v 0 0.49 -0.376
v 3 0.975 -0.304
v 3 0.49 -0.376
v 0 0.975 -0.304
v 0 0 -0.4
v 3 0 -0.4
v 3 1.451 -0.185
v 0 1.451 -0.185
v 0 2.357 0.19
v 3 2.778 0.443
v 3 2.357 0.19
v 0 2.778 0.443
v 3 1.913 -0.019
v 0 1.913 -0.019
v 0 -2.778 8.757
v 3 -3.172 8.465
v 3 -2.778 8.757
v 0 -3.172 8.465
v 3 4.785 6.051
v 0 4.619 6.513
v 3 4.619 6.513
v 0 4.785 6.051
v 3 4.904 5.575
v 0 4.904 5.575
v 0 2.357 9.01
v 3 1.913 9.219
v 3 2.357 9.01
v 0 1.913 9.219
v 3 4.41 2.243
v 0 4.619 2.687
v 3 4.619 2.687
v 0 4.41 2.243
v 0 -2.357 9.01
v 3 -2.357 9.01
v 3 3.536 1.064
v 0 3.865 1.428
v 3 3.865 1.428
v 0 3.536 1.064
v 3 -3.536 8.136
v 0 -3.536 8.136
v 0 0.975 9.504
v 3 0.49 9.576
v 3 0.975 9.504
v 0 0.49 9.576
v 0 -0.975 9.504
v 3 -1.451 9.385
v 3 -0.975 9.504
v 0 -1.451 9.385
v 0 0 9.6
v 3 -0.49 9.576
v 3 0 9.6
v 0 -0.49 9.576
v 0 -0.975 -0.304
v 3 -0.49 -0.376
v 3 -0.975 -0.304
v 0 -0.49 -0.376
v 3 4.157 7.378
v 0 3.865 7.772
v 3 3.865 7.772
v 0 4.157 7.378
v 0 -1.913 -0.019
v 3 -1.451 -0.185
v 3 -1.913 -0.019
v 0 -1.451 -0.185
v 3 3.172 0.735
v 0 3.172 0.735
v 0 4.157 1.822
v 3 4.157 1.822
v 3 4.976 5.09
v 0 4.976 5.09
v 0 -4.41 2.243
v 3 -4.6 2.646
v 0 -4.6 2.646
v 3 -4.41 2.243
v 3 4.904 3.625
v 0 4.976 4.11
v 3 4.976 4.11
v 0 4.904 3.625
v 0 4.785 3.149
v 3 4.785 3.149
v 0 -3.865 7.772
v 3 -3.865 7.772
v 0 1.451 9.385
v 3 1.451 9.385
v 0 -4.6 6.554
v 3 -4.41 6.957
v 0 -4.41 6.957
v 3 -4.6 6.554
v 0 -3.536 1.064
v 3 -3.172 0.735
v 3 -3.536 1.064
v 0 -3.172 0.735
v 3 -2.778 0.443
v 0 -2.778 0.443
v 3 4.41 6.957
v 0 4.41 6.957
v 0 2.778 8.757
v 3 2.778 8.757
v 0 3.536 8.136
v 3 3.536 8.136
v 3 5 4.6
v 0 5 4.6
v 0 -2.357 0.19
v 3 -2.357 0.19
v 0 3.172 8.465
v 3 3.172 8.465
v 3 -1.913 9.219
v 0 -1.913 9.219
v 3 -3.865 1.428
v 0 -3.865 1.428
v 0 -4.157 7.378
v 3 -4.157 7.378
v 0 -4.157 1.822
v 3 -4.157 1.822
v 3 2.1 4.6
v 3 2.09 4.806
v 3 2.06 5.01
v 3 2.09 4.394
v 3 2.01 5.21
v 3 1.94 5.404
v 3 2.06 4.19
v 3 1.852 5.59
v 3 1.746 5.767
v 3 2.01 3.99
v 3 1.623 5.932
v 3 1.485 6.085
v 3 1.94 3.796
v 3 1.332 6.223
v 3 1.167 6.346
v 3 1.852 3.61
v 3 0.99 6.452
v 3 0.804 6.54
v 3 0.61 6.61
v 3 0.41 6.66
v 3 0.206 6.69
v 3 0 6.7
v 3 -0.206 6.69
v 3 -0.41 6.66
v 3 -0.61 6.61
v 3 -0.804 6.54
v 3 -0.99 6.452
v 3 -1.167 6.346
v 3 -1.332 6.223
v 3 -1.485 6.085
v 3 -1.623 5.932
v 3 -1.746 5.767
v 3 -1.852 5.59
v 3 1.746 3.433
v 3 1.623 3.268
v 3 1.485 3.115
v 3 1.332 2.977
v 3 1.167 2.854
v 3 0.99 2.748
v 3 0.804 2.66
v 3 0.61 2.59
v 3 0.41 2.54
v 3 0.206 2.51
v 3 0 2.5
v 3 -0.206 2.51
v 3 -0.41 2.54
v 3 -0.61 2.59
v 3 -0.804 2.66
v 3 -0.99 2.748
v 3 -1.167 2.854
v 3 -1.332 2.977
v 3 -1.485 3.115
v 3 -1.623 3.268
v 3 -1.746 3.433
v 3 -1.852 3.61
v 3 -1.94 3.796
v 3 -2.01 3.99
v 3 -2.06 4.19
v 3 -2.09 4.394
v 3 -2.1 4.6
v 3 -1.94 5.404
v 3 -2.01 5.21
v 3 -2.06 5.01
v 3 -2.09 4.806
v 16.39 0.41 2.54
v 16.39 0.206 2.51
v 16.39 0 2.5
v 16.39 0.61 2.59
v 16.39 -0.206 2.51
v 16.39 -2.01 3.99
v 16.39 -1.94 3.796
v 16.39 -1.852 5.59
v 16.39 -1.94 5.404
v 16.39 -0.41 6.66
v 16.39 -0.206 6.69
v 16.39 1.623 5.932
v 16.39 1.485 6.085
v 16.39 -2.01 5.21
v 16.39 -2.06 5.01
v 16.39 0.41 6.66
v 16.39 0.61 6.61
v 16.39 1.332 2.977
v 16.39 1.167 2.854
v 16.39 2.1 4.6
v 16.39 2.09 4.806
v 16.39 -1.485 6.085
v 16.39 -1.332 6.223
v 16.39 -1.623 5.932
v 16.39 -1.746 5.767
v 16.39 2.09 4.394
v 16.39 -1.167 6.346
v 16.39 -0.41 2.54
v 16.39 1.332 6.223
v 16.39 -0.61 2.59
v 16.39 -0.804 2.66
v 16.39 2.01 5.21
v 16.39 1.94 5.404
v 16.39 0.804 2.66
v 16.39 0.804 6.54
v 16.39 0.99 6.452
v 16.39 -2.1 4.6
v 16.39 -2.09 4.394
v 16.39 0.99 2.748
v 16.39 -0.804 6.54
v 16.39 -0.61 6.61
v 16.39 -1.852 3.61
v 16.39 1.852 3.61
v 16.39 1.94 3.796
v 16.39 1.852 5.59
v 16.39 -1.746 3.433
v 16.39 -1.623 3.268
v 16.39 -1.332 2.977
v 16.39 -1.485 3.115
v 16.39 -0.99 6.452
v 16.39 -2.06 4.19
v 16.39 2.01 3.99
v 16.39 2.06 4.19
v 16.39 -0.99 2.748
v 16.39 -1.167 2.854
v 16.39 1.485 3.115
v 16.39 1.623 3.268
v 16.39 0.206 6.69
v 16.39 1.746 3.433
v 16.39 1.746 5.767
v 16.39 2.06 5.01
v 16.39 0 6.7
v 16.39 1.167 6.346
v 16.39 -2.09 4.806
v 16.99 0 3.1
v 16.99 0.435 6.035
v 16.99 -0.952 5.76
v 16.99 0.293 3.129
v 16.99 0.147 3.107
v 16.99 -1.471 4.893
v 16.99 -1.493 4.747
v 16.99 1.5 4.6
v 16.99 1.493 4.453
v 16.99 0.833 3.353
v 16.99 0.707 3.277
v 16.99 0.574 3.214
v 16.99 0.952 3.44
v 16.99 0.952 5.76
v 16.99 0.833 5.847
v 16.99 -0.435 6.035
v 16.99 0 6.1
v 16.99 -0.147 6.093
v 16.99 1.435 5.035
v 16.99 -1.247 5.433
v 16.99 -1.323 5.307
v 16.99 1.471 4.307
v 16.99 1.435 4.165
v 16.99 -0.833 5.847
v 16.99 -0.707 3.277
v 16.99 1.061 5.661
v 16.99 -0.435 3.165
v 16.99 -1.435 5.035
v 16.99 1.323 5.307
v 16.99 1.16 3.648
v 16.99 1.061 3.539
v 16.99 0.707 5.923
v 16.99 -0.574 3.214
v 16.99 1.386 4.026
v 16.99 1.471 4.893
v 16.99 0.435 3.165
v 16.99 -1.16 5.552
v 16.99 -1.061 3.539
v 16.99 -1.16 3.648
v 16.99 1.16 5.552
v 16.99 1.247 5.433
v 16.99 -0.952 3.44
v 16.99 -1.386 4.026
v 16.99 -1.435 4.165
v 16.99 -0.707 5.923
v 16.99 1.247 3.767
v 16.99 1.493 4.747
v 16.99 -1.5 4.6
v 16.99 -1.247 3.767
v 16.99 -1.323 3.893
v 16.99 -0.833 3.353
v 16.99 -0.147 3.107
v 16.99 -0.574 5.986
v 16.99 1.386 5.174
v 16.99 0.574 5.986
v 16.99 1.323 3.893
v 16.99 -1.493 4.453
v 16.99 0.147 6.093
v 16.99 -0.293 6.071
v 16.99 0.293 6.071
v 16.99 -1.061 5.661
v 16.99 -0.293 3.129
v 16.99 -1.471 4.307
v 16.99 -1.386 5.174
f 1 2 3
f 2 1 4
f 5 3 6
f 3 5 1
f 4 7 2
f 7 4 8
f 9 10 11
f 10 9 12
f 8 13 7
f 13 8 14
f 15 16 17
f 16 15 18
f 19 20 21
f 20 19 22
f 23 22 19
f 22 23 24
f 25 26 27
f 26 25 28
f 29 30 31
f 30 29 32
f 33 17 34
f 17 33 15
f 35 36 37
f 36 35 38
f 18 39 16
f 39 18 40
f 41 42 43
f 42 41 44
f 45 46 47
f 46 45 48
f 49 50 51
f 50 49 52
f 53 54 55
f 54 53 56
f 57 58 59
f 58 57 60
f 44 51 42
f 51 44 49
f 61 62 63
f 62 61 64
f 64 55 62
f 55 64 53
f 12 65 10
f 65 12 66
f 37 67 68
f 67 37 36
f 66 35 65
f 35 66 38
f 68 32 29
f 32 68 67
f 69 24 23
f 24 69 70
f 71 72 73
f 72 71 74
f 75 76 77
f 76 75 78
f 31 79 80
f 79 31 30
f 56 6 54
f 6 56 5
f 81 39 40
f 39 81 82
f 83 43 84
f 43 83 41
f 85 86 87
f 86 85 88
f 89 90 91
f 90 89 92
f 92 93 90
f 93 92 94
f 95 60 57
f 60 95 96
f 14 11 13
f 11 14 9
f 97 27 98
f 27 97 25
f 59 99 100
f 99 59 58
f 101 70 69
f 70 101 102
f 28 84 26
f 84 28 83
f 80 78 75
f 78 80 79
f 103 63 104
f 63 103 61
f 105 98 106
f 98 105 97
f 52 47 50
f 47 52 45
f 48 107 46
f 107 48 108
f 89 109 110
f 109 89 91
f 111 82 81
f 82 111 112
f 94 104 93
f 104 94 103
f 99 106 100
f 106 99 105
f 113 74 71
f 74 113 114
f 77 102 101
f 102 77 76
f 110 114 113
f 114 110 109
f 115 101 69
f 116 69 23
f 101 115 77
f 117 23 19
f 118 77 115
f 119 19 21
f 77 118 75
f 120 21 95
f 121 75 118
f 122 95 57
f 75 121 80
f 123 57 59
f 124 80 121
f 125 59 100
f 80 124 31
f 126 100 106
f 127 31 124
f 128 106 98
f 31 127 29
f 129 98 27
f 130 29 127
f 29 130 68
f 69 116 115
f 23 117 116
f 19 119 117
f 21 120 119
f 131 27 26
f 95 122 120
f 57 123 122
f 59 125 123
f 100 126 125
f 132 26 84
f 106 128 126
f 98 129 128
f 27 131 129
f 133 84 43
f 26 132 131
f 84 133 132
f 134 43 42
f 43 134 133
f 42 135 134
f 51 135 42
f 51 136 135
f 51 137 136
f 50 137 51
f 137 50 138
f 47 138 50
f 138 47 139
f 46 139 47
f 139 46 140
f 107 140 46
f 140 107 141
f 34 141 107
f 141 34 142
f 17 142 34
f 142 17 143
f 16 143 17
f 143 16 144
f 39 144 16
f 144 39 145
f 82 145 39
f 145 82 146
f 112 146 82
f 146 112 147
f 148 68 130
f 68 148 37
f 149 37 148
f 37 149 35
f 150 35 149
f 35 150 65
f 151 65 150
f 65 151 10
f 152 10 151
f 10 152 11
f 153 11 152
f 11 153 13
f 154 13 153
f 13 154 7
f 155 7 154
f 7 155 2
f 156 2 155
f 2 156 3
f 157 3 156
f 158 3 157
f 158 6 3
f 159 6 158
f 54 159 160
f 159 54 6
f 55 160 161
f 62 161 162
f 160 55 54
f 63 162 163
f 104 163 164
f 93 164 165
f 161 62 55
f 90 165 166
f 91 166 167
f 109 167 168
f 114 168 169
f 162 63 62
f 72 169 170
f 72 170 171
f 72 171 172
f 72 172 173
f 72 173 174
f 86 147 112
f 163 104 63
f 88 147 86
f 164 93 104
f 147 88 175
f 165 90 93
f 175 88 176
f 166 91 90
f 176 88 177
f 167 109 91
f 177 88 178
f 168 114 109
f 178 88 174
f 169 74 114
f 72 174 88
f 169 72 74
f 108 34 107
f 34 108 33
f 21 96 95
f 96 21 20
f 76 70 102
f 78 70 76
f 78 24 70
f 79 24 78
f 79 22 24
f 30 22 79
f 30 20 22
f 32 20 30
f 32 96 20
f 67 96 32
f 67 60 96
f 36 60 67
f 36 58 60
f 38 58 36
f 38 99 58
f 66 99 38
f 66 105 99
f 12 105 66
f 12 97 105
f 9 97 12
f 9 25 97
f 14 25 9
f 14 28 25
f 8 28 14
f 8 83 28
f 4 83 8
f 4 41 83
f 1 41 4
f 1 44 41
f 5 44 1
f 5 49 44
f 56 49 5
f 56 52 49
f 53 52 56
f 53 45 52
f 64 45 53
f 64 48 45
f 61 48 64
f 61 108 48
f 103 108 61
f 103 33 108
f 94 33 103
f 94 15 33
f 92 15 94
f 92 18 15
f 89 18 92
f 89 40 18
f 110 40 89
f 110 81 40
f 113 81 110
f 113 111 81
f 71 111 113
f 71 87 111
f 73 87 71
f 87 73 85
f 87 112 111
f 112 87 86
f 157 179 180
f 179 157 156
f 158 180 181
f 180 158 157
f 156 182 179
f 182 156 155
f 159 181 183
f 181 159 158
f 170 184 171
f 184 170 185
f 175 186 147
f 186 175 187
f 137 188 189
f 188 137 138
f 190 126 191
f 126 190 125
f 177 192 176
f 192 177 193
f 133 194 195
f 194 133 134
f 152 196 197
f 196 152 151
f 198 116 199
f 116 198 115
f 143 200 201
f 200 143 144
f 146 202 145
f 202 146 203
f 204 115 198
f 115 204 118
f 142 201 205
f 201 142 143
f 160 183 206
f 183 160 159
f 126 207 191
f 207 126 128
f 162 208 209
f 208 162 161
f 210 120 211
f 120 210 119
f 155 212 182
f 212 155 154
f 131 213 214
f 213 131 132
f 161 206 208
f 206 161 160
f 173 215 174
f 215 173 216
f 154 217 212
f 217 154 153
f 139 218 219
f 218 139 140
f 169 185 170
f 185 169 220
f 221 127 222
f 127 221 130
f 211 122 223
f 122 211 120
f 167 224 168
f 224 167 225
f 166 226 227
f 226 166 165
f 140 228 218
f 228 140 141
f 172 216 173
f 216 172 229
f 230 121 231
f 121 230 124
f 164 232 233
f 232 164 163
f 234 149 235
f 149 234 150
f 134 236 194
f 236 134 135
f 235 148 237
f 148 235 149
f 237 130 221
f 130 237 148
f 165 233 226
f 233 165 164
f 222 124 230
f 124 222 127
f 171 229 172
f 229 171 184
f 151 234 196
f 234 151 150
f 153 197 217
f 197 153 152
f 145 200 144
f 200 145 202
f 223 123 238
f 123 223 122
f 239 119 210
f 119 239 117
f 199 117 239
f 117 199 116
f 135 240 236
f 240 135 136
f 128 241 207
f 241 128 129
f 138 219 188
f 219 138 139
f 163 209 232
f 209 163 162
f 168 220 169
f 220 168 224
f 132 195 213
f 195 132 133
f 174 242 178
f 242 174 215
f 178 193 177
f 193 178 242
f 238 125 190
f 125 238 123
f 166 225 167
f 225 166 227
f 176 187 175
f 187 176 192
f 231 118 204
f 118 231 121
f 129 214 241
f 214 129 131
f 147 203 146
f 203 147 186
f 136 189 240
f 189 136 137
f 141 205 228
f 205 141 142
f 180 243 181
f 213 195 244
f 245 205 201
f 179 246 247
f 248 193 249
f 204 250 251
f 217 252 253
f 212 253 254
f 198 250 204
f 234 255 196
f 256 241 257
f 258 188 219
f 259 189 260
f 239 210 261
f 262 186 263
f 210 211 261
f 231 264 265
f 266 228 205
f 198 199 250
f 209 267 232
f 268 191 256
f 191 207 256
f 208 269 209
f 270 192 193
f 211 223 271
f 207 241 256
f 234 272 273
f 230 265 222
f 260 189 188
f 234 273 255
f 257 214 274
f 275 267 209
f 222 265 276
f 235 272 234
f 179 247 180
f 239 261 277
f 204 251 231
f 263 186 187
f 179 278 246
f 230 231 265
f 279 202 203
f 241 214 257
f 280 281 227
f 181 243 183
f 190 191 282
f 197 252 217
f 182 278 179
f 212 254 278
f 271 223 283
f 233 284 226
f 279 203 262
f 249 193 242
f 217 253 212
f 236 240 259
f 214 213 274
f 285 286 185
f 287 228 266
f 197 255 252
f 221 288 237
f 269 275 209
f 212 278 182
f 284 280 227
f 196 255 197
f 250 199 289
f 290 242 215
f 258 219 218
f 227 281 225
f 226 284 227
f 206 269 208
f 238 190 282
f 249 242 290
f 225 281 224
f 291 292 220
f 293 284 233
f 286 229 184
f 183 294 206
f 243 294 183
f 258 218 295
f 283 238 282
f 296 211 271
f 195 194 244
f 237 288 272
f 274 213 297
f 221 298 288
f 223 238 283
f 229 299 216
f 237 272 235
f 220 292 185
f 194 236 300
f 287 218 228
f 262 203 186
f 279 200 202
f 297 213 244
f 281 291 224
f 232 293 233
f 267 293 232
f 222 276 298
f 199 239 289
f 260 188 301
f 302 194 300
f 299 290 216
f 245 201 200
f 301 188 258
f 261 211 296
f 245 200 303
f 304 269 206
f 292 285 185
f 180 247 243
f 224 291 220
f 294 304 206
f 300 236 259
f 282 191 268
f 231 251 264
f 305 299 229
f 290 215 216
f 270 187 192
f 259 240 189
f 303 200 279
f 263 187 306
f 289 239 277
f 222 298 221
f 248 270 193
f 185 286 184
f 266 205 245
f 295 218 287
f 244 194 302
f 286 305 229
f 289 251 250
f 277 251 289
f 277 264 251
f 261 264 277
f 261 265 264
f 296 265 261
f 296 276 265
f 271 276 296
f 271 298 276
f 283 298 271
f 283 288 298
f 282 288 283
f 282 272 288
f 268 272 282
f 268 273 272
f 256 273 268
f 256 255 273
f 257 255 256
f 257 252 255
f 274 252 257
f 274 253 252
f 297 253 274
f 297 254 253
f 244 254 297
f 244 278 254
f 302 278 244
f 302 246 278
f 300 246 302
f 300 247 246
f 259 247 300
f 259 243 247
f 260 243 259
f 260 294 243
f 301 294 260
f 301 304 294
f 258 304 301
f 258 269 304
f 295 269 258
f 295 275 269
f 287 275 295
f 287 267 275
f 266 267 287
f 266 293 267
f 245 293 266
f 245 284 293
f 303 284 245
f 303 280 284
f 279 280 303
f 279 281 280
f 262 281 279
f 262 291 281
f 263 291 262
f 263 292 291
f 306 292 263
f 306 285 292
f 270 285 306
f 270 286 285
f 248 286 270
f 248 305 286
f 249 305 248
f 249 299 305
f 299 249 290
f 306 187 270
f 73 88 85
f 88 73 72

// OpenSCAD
// file: ../../mount_common.scad
// Fixed measurements shared by every mount option.
// Single owner: these come from the hand sketch (or were fixed by Cat) and must
// be identical in all three models. Change a value here, rebuild, and every
// option follows. Never redefine these in a model file.
//
// Source tags: [written] on the sketch, [scaled] measured off the sketch,
// [fixed] decided by Cat (not on the sketch).

/* [Envelope] */
width  = 55;   // [written] block width / camera face width
height = 110;  // [written]

/* [Ring mounting holes] */
ring_hole_d       = 2.25;  // [written] pilot for the Ring bracket screws
ring_hole_spacing = 91.5;  // [written] centre to centre, vertically centred
ring_hole_depth   = 12;    // [chosen]  measured into the camera face

/* [Wiring pocket] */
pocket_z_min      = 30;    // [written] bottom of pocket above block bottom
pocket_z_max      = 60;    // [written] top of pocket above block bottom
pocket_deep_inset = 9;     // [scaled]  pocket edge to deep side, front view
pocket_width      = 34.3;  // [scaled]  front-view width
pocket_depth      = 15;    // [fixed]   behind the camera plate

/* [Cable hole] */
cable_d          = 8;      // [written]
cable_z          = 35;     // [scaled] centre height
cable_deep_inset = 17;     // [scaled] centre to deep side (where the wire leaves the wall)

/* [Mounting screws] (through the width, into the mounting surface) */
// Size is shared so every option takes the same screws. Their POSITIONS are not
// fixed (Cat, 2026-11-01): each model sets its own screw_y / screw_z.
// Screws: #8 flat (bevel) head wood screws [fixed by Cat]. Sizes per ASME
// B18.6.1 as recalled, not looked up: shank 0.164 in (4.17 mm), head up to
// 0.332 in (8.43 mm), 82 degree head. Measure a real screw to confirm.
screw_d      = 4.6;        // [fixed] clearance for #8 (4.17 mm shank) so it pulls the mount tight
screw_head_d = 8.8;        // [fixed] countersink diameter for the #8 head (8.43 mm max)
screw_sink_angle = 82;     // [fixed] US flat-head angle (metric is 90)
// main file
// Print file: option 3 (dovetail slide), the lock pin.
// build.ps1 exports ../stl/pin.stl from this file. Print orientation: Lying on its small flat.
//
// To change this one print: uncomment a setting below (or add any value from
// ../option3_dovetail.scad), then in OpenSCAD press F6 and use File > Export > STL.
// The last value set wins, so a setting here only affects this print.
//   - Fixed measurements (mount_common.scad) can't be changed here: the build fails.
//   - Print tolerances that two parts share must match, so change those in
//     ../option3_dovetail.scad instead. The build warns if one is set here.

include <../option3_dovetail.scad>

part = "pin";

// Settings for this print:
// (none specific to this part)
